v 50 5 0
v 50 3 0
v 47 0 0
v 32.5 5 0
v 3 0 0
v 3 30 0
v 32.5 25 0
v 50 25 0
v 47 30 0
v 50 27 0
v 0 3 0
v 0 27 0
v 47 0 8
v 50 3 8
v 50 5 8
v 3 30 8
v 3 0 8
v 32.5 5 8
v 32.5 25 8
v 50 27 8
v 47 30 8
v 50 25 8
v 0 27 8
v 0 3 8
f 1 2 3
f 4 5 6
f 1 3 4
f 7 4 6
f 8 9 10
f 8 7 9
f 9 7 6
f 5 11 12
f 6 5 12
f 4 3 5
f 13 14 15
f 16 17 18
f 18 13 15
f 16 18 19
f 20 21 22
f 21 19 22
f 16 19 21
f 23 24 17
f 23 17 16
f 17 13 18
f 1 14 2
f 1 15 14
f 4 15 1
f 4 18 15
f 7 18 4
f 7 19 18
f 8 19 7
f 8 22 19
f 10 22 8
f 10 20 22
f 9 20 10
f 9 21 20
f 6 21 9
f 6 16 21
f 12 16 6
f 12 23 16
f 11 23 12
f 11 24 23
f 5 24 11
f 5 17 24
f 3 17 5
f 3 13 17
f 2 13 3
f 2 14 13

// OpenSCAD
$fn = 32;

// ----------------------------------------------------------------------
// C washer: 50 x 30 mm plate with an open slot
// ----------------------------------------------------------------------

// --- parameters (mm) ---
profile_height = 8;       // extrusion height
profile_points = 12;      // points of the closed outline

profile = [[3, 0], [47, 0], [50, 3], [50, 5], [32.5, 5], [32.5, 25], [50, 25], [50, 27], [47, 30], [3, 30], [0, 27], [0, 3]];  // single closed polygon, 12 points, counter clockwise

// --- the one profile operation ---
linear_extrude(height = profile_height) polygon(points = profile);
